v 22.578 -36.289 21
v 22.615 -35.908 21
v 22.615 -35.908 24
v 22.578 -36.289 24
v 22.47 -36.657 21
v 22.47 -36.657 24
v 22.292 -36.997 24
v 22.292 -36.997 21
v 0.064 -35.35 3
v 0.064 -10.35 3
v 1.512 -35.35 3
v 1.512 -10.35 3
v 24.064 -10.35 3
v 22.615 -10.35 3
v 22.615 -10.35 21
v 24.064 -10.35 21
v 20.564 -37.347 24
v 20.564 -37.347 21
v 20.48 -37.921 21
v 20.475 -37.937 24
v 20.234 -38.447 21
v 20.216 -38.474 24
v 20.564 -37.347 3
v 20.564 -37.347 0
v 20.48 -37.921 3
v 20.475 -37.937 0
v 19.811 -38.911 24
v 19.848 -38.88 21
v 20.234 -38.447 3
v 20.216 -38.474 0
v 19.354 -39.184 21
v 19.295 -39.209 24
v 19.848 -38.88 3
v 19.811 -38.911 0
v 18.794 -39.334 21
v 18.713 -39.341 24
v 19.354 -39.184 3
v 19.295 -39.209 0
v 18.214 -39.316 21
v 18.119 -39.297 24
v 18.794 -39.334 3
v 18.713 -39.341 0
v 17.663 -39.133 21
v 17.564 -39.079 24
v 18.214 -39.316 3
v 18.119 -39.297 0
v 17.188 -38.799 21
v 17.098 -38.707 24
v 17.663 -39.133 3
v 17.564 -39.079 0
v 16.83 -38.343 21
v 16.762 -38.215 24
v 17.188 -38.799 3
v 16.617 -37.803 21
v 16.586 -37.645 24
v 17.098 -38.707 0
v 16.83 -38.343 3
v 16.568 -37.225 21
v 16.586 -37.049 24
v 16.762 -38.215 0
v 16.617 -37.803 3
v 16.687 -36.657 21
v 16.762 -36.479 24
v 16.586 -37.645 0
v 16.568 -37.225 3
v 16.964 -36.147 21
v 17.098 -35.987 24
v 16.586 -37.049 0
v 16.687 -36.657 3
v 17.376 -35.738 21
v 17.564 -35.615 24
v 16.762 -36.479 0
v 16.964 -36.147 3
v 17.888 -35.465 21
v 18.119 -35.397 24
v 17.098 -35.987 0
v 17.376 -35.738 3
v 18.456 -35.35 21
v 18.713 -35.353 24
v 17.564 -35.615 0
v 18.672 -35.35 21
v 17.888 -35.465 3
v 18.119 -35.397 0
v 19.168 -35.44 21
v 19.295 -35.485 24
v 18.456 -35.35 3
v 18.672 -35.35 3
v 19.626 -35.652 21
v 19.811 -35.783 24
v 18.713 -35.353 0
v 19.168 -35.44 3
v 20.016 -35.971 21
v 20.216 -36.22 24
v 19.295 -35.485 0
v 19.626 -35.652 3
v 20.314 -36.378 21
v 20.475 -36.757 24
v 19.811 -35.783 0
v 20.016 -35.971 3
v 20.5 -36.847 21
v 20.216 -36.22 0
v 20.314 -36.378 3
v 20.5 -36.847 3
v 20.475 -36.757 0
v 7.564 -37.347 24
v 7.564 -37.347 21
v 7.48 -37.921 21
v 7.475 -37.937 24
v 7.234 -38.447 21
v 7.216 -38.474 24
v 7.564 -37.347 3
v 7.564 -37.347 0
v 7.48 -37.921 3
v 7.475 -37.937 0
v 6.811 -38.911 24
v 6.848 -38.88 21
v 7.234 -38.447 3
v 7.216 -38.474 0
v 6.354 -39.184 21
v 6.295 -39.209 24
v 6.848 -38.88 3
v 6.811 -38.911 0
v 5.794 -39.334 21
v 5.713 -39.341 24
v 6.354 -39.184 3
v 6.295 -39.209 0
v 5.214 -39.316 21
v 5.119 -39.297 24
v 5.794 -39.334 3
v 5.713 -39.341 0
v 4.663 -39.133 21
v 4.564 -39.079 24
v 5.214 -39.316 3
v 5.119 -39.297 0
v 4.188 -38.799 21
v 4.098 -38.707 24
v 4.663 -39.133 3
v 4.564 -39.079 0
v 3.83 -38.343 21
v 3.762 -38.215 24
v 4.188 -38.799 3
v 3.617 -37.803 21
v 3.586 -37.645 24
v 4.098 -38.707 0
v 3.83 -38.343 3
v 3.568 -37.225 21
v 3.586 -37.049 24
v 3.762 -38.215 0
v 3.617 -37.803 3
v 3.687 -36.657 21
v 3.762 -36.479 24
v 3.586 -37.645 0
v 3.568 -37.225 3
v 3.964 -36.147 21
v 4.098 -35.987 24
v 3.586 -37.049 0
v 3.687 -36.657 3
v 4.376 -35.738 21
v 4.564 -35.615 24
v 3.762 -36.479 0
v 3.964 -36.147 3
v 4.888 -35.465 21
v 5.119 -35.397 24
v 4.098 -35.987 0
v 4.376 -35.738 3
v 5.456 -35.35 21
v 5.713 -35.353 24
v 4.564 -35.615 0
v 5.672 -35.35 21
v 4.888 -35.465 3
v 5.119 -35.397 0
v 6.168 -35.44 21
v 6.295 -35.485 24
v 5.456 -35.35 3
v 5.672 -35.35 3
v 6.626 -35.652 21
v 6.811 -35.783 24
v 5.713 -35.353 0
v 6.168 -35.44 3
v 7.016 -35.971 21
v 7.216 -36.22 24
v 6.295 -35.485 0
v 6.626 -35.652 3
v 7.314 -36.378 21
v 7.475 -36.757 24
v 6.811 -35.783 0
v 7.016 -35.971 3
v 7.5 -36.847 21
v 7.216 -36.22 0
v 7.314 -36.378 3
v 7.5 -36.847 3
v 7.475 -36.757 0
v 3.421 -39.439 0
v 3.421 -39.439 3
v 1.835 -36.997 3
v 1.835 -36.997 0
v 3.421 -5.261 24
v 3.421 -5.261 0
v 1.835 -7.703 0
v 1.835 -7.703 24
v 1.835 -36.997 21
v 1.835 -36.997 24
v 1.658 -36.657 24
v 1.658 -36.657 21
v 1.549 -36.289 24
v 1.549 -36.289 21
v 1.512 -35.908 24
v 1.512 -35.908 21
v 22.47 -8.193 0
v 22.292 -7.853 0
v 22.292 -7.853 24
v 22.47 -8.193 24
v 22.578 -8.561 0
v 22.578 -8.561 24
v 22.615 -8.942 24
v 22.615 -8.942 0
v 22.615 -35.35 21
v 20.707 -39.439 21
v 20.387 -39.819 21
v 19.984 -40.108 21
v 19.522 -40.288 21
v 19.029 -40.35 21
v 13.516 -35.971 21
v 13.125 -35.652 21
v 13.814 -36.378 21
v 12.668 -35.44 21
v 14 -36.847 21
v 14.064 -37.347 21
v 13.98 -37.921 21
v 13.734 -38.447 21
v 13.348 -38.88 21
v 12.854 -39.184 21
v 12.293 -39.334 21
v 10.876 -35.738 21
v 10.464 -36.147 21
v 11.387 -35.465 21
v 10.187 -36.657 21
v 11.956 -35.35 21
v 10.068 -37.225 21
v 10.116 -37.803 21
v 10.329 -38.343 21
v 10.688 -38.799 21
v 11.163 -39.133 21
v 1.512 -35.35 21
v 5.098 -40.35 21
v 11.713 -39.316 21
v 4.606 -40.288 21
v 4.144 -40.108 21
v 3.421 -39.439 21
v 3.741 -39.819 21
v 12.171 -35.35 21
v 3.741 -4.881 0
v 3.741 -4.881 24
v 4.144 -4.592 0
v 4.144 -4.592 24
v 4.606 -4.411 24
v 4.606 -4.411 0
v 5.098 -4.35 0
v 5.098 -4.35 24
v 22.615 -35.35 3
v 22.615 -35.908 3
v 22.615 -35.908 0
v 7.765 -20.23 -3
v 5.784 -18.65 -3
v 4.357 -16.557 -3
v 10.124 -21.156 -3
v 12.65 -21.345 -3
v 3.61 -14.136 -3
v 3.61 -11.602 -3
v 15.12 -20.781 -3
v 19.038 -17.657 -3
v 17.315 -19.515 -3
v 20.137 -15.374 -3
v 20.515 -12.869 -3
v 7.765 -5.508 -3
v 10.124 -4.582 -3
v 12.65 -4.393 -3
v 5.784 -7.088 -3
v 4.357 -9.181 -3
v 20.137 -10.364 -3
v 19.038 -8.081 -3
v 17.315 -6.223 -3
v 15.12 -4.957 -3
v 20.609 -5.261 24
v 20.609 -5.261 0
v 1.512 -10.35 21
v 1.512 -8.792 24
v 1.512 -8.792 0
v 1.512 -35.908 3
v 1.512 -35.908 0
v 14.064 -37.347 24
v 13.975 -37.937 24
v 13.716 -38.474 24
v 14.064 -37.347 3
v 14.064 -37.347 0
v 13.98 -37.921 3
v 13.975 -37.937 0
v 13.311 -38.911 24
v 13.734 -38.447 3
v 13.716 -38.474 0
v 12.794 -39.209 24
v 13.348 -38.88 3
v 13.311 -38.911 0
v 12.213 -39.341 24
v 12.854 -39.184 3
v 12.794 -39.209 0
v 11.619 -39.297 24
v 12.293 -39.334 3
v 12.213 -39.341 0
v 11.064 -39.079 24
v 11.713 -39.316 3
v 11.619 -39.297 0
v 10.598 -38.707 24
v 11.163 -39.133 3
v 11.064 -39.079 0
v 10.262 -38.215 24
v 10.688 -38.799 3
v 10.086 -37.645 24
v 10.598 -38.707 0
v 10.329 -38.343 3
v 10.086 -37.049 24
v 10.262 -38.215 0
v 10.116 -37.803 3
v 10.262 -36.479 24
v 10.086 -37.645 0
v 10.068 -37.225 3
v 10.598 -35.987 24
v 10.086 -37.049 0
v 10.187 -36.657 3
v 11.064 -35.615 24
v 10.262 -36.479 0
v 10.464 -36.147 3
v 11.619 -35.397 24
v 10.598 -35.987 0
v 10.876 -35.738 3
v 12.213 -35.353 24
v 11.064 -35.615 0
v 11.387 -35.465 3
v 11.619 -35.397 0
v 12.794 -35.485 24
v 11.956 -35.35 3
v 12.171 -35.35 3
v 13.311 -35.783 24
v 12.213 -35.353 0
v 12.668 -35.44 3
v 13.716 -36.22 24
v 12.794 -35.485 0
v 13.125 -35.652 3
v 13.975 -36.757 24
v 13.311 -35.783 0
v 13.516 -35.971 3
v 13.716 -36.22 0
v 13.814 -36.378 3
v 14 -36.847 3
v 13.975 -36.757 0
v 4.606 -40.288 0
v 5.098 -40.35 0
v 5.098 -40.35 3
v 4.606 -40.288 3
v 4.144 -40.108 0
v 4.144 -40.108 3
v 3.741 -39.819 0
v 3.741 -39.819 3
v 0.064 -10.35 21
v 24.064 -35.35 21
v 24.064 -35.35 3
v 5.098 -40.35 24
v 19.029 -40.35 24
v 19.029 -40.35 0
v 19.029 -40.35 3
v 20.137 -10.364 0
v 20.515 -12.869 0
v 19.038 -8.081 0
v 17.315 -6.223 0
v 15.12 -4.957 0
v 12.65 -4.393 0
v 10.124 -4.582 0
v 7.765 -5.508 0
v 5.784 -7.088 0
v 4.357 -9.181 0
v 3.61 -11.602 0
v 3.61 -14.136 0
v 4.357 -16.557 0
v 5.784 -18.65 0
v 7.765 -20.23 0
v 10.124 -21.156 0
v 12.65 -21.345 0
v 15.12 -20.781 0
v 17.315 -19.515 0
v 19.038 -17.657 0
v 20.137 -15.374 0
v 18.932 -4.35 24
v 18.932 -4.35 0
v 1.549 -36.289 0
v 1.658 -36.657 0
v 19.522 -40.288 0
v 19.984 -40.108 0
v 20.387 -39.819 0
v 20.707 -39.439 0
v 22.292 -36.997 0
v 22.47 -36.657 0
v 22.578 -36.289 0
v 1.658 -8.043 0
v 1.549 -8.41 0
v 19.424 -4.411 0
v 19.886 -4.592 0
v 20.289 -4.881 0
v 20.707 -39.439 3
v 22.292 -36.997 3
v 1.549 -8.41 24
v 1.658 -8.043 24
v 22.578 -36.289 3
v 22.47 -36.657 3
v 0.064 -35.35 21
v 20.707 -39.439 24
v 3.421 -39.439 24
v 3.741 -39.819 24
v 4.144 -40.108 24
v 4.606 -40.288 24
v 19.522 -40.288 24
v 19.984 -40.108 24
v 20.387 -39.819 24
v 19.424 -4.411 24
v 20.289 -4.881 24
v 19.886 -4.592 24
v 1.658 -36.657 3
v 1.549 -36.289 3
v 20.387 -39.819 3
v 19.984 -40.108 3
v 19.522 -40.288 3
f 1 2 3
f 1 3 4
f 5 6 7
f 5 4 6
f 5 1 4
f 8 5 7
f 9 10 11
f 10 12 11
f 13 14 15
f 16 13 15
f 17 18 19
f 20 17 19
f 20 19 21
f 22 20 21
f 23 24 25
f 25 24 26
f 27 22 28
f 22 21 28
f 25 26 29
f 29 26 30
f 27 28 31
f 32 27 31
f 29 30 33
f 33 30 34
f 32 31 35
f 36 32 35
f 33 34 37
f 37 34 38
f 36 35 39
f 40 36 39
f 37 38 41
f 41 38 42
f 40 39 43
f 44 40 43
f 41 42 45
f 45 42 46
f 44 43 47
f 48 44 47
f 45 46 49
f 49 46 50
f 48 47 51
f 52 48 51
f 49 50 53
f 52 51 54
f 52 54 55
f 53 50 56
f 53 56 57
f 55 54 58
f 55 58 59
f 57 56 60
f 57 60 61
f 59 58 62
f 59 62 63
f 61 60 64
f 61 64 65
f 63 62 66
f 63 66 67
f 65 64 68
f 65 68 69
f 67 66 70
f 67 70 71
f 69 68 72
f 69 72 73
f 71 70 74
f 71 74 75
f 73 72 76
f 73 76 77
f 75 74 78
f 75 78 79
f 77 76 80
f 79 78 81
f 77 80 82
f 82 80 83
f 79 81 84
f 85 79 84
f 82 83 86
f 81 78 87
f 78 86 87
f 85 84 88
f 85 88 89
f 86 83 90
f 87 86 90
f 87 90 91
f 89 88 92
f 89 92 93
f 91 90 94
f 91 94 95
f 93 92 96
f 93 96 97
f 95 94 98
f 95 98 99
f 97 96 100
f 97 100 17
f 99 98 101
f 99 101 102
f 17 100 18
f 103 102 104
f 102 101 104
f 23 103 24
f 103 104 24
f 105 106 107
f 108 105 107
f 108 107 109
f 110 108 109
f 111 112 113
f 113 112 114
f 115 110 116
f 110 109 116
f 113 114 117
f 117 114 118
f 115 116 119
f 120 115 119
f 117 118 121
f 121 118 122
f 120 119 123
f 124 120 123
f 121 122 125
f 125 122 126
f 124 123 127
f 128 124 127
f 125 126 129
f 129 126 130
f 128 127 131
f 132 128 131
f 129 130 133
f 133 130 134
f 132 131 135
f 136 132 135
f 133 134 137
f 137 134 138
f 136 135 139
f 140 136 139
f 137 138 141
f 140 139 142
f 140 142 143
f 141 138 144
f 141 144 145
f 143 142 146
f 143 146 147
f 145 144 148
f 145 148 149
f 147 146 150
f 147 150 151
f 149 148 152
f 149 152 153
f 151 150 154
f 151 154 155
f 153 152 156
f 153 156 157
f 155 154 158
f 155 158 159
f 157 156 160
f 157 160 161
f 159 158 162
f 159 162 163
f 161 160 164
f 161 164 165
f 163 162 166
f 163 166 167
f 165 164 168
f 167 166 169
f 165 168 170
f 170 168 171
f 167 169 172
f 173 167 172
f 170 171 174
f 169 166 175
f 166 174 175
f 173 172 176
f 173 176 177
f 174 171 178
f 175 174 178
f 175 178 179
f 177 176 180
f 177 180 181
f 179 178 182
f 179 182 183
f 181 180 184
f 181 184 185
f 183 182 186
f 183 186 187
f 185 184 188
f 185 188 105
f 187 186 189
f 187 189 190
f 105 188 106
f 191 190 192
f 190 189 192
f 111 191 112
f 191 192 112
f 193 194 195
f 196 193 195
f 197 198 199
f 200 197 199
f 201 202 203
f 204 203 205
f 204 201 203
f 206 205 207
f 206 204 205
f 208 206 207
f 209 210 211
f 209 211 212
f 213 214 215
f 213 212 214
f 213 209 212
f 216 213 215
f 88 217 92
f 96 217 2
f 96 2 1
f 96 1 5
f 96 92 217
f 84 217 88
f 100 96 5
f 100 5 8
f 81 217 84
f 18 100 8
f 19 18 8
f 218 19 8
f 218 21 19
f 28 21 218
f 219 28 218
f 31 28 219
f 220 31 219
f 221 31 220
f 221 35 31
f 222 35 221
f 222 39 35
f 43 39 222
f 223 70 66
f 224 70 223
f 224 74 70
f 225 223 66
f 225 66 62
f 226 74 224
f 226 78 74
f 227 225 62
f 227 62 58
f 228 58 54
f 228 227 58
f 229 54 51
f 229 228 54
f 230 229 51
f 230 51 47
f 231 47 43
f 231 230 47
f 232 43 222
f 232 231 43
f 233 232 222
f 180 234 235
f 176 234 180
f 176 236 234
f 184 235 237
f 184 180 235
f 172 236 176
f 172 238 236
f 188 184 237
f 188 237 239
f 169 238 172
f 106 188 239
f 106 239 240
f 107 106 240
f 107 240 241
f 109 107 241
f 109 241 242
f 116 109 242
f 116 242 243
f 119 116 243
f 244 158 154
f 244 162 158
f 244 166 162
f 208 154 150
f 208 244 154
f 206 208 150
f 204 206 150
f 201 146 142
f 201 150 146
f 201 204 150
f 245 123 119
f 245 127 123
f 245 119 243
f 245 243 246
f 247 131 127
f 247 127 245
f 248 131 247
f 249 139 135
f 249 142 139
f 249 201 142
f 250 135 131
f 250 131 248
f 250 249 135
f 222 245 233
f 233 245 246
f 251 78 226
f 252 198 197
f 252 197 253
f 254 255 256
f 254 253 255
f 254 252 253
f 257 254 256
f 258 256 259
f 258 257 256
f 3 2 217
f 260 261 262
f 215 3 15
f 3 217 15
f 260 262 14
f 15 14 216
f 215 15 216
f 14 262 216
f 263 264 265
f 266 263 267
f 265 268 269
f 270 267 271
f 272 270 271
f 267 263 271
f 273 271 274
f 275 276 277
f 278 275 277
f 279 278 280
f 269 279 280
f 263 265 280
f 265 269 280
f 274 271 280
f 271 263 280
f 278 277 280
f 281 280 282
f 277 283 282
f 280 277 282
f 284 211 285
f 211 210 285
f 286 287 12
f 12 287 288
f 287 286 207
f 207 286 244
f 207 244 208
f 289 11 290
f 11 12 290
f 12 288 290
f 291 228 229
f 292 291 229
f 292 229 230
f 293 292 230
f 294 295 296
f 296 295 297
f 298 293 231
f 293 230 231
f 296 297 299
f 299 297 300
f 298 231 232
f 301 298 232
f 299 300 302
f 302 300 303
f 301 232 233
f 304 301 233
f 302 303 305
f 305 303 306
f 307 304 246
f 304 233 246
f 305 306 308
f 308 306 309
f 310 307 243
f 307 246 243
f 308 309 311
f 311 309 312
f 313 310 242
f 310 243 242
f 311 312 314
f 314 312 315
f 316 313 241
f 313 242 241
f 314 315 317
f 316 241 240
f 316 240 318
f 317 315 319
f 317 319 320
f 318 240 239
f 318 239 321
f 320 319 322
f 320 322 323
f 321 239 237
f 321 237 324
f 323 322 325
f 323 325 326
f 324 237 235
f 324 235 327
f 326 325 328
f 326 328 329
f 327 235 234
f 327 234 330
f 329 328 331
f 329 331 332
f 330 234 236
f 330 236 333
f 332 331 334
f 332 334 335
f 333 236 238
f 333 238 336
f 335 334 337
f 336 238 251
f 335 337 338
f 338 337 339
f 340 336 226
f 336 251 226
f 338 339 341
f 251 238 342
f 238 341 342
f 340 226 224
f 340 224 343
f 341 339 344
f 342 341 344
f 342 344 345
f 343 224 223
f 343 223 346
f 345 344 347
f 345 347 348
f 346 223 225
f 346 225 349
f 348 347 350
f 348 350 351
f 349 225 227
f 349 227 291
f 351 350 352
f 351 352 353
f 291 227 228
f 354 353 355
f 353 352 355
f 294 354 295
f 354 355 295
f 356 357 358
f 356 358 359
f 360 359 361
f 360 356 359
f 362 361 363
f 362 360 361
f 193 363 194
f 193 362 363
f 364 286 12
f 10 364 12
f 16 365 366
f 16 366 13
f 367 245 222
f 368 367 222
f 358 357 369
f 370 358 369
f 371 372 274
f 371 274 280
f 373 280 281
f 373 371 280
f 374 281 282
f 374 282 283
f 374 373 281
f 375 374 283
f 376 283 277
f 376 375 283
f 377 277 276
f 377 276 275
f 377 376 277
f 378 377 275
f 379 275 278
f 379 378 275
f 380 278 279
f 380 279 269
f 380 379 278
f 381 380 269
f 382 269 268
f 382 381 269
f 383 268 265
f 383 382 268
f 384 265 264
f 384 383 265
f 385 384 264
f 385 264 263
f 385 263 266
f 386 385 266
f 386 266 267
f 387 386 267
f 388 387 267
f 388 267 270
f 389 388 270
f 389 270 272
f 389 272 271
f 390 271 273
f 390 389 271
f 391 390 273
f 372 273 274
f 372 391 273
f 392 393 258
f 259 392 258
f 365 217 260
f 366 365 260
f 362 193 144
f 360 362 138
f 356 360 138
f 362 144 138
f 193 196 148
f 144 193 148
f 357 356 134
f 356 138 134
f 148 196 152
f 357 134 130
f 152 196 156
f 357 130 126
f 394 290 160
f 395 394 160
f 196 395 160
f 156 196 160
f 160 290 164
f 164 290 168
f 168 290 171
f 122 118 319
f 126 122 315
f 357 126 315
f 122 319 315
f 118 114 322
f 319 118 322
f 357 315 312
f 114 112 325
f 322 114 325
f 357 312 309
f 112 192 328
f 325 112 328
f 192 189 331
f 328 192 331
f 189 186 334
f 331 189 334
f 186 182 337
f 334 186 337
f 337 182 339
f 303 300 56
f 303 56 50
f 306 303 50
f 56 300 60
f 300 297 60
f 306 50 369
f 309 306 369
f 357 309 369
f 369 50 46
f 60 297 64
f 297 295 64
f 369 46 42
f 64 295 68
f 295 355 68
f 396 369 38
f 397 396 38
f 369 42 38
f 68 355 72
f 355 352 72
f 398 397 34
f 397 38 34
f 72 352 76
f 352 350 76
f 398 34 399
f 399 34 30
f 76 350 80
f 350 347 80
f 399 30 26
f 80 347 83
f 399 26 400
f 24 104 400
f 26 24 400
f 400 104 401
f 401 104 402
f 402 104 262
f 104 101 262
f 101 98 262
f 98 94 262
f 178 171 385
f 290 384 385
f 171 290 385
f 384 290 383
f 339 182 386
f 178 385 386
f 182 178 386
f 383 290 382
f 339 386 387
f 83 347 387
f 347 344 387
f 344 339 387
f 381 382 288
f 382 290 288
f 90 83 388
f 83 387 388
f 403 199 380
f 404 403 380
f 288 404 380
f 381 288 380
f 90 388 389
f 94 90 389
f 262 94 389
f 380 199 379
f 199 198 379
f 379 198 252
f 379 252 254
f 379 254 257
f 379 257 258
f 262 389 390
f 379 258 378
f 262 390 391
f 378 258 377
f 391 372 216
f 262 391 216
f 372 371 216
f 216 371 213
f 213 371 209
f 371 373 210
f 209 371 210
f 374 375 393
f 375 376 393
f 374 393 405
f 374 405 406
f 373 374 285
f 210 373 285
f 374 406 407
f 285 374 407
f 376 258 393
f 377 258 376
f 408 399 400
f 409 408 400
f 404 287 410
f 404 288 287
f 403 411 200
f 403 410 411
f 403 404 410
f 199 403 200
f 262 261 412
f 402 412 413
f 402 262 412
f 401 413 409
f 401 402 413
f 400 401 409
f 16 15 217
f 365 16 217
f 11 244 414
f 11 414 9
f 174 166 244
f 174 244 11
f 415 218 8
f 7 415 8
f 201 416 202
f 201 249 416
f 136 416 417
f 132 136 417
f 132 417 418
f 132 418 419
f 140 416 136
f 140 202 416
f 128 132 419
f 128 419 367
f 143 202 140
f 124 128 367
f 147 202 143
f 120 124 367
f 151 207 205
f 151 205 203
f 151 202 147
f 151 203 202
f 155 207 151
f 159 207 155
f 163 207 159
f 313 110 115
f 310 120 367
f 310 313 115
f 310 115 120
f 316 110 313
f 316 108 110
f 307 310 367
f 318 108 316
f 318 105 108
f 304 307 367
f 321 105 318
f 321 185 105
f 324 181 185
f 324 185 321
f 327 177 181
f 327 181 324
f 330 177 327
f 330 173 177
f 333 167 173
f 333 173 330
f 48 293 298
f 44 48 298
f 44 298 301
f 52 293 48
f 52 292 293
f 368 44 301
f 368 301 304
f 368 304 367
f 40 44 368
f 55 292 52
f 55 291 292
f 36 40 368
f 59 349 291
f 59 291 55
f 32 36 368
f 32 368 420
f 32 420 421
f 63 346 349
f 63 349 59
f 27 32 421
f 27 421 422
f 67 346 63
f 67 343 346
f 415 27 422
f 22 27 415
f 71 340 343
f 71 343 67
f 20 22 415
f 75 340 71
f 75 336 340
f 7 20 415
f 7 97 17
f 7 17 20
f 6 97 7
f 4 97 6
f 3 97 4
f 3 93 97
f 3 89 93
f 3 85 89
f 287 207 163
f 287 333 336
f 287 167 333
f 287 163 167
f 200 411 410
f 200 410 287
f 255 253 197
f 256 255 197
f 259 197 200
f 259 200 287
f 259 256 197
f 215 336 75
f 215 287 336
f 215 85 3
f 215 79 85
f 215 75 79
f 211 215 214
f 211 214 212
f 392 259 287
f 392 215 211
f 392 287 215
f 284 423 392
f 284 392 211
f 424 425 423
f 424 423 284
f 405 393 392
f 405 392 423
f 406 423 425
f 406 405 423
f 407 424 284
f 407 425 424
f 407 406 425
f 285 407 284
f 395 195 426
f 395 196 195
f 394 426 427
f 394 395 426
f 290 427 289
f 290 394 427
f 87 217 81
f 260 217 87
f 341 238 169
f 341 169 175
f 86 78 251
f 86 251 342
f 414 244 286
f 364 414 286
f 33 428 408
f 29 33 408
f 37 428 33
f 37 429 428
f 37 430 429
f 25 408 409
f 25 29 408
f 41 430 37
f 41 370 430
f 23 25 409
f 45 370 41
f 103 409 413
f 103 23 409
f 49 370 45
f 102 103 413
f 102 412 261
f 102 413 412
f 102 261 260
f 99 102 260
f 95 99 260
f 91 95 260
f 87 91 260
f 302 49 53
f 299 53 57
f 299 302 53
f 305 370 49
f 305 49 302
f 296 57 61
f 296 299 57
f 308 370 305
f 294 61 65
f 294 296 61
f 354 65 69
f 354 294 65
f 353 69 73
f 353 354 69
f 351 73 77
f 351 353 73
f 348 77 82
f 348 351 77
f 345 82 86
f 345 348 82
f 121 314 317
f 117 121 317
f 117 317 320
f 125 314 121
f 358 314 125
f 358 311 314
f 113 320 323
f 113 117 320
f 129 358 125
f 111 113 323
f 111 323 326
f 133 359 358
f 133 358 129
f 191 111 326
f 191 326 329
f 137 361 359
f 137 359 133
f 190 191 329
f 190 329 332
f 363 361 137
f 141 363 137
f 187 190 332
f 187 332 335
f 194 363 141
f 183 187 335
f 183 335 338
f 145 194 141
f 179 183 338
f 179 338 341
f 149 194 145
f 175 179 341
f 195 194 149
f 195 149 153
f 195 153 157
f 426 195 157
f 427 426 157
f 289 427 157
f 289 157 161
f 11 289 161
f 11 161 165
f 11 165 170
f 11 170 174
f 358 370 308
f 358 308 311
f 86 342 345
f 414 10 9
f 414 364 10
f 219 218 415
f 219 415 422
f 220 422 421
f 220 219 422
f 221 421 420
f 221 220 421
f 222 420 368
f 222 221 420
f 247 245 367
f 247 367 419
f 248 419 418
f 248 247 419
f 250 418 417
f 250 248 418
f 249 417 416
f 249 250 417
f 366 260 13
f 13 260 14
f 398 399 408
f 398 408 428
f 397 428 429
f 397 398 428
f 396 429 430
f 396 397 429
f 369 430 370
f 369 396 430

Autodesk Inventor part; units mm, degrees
ref_plane "YZ Plane" through (0, 0, 0) normal (1, 0, 0) x (0, 1, 0)
ref_plane "XZ Plane" through (0, 0, 0) normal (0, 1, 0) x (-1, 0, 0)
sketch "Sketch2" plane through (0, 0, 0) normal (0, 0, 1) x (1, 0, 0)
  line L0 (5.0984, -40.3499) -> (19.0293, -40.3499)
  line L1 (22.6152, -35.9079) -> (22.6152, -8.9424)
  line L2 (18.9317, -4.3499) -> (5.0984, -4.3499)
  line L3 (1.5125, -8.792) -> (1.5125, -35.9079)
  line L4 (3.421, -5.2607) -> (1.8351, -7.7028)
  line L5 (3.421, -39.4392) -> (1.8351, -36.9971)
  line L6 (20.7066, -39.4392) -> (22.2925, -36.9971)
  line L7 (22.2925, -7.8531) -> (20.609, -5.2607)
  arc A0 (5.0984, -4.3499) -> (3.421, -5.2607) centre (5.0984, -6.3499) ccw
  arc A1 (1.8351, -7.7028) -> (1.5125, -8.792) centre (3.5125, -8.792) ccw
  arc A2 (20.609, -5.2607) -> (18.9317, -4.3499) centre (18.9317, -6.3499) ccw
  arc A3 (22.6152, -8.9424) -> (22.2925, -7.8531) centre (20.6152, -8.9424) ccw
  arc A4 (1.5125, -35.9079) -> (1.8351, -36.9971) centre (3.5125, -35.9079) ccw
  arc A5 (3.421, -39.4392) -> (5.0984, -40.3499) centre (5.0984, -38.3499) ccw
  arc A6 (19.0293, -40.3499) -> (20.7066, -39.4392) centre (19.0293, -38.3499) ccw
  arc A7 (22.2925, -36.9971) -> (22.6152, -35.9079) centre (20.6152, -35.9079) ccw
  point P0 (0, 0)
  point P1 (22.6152, -4.3499)
  point P2 (22.6152, -40.3499)
  dimension "d116" = 36
  dimension "d117" = 2
  dimension "d119" = 2
extrude "Extrusion1" add sketch "Sketch2" along normal blind 24
sketch "Sketch3" plane through (0, 0, 0) normal (0, 0, 1) x (1, 0, 0)
  circle A0 centre (12.015, -12.869) radius 8.5
  point P0 (0, 0)
  dimension "d244" = 17
extrude "Extrusion2" add sketch "Sketch3" against normal blind 3
sketch "Sketch6" plane through (0, 0, 0) normal (1, 0, 0) x (0, 1, 0)
  line L0 (-40.3499, 0) -> (-40.3499, 24) projected
  line L1 (-40.3499, 3) -> (-35.3499, 3)
  line L2 (-35.3499, 3) -> (-35.3499, 21)
  line L3 (-35.3499, 21) -> (-40.3499, 21)
  line L4 (-40.3499, 21) -> (-40.3499, 3)
  point P0 (0, 0)
  dimension "d221" = 5
  dimension "d222" = 18
extrude "Extrusion3" cut sketch "Sketch6" along normal up to next
ref_plane "Work Plane2" through (1.5125, -8.792, 24) normal (-1, 0, 0) x (0, -1, 0)
sketch "Sketch8" plane through (1.5125, -8.792, 24) normal (-1, 0, 0) x (0, -1, 0)
  line L0 (26.5579, -3) -> (26.5579, -21) projected
  line L1 (26.5579, -3) -> (1.5579, -3)
  line L2 (1.5579, -3) -> (1.5579, -21)
  line L3 (1.5579, -21) -> (26.5579, -21)
  line L4 (26.5579, -21) -> (26.5579, -3)
  dimension "d243" = 25
extrude "Extrusion4" add sketch "Sketch8" along normal blind 1.4485
ref_plane "Work Plane3" through (22.6152, -35.9079, 24) normal (1, 0, 0) x (0, 1, 0)
sketch "Sketch9" plane through (22.6152, -35.9079, 24) normal (1, 0, 0) x (0, 1, 0)
  line L0 (0.5579, -21) -> (25.5579, -21)
  line L1 (25.5579, -21) -> (25.5579, -3)
  line L2 (25.5579, -3) -> (0.5579, -3)
  line L3 (0.5579, -3) -> (0.5579, -21)
  dimension "d239" = 25
  dimension "d240" = 18
extrude "Extrusion5" add sketch "Sketch9" along normal blind 1.4485
sketch "Sketch10" plane through (0, 0, 0) normal (0, 0, 1) x (1, 0, 0)
  circle A0 centre (12.0638, -37.347) radius 2
  circle A1 centre (5.564, -37.347) radius 2
  circle A2 centre (18.564, -37.347) radius 2
  point P0 (0, 0)
  dimension "d245" = 4
  dimension "d246" = 4
  dimension "d247" = 4
extrude "Extrusion7" cut sketch "Sketch10" along normal blind 24
properties part number "servo"
